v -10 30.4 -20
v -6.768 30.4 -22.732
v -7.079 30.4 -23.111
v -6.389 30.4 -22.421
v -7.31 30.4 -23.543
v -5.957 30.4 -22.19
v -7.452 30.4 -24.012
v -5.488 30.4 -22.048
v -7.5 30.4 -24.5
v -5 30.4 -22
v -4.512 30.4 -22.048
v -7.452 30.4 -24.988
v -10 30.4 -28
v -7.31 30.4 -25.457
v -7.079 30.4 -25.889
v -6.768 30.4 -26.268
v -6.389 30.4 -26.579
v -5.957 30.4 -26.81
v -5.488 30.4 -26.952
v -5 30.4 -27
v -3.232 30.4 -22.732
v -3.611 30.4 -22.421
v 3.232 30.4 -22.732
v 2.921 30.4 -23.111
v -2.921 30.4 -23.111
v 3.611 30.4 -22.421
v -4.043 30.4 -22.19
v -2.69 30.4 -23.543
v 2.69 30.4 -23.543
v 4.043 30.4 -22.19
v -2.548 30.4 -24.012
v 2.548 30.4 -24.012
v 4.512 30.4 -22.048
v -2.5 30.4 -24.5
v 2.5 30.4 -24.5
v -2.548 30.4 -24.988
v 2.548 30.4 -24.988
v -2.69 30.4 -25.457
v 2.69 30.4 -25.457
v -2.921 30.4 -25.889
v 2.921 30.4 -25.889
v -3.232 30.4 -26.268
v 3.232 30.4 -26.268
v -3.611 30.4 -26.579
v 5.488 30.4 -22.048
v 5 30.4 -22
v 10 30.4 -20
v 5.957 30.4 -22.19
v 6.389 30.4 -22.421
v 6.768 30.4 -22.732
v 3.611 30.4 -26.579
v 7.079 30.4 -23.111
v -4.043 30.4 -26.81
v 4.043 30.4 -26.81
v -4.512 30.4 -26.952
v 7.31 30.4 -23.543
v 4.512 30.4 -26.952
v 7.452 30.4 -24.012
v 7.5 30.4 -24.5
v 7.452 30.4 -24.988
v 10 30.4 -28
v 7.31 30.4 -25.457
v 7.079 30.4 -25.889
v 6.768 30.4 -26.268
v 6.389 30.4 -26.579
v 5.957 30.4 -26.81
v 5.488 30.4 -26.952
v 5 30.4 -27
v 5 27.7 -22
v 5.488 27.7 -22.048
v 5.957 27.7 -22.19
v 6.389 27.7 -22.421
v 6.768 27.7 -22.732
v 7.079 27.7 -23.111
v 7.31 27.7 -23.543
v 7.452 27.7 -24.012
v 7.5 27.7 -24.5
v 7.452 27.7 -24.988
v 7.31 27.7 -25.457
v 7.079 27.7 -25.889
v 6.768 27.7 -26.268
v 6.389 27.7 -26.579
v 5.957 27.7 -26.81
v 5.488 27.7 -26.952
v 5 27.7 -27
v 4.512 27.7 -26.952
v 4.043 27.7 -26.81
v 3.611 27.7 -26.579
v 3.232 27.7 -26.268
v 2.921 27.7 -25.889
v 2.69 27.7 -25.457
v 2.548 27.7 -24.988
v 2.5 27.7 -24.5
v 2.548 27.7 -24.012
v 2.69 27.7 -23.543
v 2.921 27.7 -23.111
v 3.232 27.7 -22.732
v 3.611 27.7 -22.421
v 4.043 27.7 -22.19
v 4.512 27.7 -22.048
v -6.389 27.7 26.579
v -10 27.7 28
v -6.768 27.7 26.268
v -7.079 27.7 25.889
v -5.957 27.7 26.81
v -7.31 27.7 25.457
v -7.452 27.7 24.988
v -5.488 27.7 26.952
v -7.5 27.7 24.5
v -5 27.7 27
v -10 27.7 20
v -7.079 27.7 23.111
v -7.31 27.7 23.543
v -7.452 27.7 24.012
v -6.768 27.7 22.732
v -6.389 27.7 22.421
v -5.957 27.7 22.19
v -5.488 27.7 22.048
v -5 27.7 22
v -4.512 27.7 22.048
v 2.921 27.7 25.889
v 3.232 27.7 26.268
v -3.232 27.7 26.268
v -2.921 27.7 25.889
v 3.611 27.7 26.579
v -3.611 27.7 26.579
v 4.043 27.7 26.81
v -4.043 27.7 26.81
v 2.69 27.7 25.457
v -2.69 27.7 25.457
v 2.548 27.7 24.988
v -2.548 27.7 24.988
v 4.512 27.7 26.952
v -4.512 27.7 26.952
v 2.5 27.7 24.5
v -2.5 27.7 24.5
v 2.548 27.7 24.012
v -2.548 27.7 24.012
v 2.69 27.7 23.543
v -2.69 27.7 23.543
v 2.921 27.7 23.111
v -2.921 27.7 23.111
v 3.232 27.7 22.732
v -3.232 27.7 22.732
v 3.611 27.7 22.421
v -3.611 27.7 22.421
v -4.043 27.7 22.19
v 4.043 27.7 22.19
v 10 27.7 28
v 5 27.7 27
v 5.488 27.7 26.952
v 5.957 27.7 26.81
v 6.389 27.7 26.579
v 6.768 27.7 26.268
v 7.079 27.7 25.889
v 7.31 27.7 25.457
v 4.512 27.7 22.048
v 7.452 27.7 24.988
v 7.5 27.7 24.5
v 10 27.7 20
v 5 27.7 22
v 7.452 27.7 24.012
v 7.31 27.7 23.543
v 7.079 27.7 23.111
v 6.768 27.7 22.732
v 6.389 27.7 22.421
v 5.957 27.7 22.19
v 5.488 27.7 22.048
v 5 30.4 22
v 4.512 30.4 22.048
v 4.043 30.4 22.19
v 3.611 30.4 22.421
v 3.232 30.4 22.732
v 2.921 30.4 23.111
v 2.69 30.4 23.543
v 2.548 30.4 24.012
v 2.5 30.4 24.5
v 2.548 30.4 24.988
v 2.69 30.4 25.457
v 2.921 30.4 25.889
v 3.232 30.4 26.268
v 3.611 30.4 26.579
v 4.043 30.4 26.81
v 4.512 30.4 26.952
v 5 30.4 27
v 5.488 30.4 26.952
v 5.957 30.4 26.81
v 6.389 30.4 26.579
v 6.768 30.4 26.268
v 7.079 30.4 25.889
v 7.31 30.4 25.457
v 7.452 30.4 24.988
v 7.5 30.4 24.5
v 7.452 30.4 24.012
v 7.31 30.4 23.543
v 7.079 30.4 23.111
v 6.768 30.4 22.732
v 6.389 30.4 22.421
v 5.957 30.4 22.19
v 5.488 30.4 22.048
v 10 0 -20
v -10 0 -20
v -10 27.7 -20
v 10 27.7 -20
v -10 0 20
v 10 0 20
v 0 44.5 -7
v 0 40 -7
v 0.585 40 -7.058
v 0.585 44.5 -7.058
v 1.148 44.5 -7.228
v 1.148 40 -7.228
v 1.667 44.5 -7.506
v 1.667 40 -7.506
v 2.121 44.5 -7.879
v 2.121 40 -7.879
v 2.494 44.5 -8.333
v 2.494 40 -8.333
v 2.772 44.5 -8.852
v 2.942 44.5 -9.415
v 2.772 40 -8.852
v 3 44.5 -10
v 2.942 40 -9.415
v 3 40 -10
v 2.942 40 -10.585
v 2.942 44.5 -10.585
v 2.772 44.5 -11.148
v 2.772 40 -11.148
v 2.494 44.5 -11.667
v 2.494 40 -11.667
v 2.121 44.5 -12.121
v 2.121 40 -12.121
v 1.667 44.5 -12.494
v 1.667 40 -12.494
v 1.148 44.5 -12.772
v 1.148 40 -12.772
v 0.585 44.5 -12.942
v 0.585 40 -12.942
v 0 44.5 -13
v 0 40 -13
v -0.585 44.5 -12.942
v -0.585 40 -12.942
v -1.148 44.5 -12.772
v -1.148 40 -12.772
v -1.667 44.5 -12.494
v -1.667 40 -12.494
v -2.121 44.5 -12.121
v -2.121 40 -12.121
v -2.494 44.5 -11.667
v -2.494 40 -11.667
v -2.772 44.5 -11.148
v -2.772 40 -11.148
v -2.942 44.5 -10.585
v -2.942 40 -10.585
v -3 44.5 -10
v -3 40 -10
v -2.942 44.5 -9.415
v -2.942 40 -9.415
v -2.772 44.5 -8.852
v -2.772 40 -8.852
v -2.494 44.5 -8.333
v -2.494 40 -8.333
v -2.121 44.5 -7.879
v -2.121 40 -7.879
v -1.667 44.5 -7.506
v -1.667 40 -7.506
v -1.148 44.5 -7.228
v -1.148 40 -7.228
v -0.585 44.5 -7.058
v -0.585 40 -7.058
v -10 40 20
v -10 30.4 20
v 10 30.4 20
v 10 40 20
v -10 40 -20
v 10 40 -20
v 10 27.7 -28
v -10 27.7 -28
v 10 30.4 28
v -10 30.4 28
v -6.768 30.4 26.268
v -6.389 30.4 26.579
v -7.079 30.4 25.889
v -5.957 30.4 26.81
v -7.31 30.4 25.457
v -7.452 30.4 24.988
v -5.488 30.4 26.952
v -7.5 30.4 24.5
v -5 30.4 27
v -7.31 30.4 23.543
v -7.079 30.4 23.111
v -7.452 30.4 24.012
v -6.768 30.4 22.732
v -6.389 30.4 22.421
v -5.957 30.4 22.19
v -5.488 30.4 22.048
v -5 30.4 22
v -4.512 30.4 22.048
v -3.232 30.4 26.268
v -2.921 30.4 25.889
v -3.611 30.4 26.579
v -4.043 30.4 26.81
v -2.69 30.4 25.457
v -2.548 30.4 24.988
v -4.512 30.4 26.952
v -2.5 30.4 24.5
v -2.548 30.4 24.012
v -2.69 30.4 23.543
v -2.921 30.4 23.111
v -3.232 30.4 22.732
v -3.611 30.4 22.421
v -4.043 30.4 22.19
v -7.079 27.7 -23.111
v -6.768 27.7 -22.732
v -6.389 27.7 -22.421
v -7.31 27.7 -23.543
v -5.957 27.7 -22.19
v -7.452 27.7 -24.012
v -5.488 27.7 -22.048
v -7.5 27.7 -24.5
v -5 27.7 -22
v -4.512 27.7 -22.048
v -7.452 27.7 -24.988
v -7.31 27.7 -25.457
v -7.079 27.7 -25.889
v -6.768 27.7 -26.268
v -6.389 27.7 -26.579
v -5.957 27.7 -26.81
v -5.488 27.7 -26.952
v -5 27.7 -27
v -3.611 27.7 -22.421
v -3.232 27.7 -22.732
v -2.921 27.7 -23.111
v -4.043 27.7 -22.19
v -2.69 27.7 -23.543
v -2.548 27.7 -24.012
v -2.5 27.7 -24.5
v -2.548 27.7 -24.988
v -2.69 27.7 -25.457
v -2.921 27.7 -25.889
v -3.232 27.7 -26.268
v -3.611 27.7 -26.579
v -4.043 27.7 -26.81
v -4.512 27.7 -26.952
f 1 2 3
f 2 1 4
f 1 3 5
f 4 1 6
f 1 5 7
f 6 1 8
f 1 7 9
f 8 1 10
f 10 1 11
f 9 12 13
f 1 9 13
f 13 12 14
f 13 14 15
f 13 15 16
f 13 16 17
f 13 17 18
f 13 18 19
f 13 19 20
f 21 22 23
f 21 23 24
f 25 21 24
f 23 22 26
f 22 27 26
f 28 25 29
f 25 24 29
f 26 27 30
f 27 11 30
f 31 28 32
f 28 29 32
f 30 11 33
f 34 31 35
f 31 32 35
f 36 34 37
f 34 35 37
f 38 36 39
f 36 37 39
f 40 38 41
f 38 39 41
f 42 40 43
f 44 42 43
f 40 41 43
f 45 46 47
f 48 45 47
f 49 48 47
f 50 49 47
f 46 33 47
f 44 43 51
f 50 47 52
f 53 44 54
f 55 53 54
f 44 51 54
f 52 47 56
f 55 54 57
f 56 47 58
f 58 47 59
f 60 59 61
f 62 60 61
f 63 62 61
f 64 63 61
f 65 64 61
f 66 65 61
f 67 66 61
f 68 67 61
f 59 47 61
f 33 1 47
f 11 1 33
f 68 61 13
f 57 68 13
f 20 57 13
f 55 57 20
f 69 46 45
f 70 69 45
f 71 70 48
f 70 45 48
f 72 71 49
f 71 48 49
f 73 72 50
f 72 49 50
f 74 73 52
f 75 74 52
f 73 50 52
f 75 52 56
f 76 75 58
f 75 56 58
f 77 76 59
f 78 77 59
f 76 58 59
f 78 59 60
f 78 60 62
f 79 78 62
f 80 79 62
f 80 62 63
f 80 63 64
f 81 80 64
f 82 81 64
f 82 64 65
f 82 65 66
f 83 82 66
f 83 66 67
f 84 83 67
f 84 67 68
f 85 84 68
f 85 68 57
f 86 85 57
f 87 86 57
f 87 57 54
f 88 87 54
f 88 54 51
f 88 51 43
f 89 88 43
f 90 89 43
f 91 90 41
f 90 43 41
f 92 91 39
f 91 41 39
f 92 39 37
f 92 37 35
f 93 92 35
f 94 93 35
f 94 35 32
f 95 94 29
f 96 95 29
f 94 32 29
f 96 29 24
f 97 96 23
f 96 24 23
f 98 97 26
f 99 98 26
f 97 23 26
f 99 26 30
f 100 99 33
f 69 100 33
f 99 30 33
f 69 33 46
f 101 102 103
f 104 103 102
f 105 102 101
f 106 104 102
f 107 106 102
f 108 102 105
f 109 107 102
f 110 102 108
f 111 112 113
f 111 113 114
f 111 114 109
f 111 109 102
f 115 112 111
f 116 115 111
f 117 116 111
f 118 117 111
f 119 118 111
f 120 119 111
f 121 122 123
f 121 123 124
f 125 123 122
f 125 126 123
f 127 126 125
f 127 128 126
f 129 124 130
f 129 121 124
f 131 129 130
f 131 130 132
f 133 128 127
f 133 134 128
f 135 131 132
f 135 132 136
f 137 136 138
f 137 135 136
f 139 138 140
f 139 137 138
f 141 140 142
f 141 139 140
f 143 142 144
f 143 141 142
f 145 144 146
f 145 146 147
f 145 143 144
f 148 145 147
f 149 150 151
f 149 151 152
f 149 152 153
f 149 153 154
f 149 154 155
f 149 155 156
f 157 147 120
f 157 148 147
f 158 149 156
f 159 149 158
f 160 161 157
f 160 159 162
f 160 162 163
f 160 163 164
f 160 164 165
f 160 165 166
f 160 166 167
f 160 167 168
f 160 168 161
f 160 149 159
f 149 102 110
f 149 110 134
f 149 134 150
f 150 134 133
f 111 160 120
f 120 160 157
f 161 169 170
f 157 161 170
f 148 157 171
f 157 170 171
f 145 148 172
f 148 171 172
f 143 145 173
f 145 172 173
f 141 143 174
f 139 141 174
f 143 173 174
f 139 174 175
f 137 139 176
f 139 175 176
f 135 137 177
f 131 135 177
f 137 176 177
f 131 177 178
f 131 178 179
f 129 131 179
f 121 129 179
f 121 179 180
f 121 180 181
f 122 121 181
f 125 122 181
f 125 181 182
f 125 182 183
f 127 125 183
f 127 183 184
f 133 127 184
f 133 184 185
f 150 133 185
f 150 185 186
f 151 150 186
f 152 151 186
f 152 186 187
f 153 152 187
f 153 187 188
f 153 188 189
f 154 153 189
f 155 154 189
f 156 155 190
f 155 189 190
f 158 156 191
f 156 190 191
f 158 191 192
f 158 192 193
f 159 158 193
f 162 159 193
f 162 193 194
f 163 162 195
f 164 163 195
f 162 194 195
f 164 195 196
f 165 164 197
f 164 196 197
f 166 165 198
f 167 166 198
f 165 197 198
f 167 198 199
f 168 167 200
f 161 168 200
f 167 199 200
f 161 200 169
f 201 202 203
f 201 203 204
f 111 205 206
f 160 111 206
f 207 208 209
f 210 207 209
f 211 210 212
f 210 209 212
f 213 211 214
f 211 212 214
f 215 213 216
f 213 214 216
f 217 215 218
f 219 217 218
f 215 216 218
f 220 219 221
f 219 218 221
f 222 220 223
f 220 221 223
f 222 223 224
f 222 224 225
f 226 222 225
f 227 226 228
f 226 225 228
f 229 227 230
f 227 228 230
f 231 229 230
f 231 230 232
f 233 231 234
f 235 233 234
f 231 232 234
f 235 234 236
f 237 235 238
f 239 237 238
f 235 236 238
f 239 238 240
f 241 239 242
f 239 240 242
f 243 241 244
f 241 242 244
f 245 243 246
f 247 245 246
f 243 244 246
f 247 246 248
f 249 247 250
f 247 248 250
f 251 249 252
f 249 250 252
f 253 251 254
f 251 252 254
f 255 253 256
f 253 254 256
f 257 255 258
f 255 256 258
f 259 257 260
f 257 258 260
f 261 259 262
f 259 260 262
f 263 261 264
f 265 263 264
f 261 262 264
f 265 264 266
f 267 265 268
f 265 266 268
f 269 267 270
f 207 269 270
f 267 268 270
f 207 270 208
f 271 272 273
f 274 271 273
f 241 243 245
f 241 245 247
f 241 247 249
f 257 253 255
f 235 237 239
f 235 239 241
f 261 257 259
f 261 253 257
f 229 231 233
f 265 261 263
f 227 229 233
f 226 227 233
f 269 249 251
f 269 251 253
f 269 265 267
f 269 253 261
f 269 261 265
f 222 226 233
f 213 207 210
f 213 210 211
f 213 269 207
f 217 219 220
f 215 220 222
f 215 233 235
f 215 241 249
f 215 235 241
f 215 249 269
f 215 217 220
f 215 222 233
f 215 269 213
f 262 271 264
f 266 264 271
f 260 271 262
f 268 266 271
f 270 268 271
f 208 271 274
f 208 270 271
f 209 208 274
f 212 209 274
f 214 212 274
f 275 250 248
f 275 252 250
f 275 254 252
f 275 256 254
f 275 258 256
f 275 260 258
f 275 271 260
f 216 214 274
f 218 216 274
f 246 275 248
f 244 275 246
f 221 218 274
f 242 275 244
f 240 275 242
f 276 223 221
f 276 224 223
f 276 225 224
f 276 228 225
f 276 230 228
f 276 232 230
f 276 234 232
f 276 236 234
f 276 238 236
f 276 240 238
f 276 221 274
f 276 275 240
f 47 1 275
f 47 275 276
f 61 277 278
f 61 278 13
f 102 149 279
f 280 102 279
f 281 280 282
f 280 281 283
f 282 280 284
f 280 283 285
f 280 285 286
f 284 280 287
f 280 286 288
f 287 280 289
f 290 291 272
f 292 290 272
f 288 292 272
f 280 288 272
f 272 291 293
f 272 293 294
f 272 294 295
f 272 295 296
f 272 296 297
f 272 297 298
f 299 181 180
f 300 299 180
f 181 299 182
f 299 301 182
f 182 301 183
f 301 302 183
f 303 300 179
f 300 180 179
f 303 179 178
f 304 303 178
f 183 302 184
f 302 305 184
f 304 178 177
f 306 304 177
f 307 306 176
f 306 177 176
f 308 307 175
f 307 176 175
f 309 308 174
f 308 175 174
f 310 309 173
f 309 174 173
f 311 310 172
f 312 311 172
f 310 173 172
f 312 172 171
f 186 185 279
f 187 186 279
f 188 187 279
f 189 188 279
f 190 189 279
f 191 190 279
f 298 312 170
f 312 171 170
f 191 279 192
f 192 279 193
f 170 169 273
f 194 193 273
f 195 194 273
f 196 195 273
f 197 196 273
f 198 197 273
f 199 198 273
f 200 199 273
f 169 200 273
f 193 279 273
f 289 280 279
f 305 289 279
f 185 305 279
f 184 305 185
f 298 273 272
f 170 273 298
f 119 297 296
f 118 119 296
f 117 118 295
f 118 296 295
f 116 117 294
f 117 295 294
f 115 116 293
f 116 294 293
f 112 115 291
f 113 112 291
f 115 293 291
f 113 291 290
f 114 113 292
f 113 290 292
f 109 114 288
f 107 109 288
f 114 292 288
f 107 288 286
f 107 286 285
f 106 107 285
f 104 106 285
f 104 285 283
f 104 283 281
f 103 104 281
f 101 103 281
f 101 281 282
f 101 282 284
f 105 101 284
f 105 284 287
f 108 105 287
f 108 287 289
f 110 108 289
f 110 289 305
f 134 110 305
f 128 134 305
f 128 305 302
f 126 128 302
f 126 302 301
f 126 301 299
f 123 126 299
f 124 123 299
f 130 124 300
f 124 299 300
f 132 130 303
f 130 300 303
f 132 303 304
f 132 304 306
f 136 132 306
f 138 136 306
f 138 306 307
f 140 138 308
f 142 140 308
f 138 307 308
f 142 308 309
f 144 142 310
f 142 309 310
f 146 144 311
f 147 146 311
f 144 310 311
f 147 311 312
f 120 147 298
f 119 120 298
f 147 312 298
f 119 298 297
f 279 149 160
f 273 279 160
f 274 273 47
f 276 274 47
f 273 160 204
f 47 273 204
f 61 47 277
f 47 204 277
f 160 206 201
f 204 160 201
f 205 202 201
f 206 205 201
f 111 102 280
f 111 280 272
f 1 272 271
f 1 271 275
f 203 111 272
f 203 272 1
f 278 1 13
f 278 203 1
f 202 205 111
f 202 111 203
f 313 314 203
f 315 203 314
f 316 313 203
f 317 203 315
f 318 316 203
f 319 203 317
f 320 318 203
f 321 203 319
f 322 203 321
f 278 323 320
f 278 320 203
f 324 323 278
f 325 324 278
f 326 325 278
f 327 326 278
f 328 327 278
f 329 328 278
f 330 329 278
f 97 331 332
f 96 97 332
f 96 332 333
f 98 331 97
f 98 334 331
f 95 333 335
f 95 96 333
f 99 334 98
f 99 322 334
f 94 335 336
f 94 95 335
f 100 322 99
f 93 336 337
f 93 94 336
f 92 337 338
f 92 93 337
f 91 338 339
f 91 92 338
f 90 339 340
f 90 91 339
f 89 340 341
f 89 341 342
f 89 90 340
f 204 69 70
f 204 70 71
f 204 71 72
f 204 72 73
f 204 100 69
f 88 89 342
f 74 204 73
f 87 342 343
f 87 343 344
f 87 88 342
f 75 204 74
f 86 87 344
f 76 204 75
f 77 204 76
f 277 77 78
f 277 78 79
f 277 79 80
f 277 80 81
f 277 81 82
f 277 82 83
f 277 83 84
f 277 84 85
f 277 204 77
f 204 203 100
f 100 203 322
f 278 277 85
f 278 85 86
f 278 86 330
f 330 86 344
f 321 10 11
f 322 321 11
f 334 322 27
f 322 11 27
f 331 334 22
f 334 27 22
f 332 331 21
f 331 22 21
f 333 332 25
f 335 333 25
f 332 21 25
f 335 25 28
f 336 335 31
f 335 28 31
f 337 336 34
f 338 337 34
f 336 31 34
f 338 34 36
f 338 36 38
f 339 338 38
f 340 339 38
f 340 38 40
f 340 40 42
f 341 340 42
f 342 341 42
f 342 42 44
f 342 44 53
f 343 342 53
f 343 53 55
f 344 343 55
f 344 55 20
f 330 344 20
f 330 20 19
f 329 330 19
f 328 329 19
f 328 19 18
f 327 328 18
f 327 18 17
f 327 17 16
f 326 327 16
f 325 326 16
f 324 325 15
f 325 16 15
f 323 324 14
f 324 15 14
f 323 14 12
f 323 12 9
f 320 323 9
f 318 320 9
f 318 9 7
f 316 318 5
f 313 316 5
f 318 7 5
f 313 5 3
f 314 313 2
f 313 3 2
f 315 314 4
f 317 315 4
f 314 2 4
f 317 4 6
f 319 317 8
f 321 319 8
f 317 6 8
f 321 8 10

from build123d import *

# Parameters (mm, degrees)
SKETCH_1_W          = 20
SKETCH_1_H          = 40
EXTRUDE_1_DEPTH     = 40
SKETCH_3_W          = 8
SKETCH_3_H          = 2.7
EXTRUDE_2_DEPTH     = 20
SKETCH_4_R          = 2.5
CUT_EXTRUDE_1_DEPTH = 40
SKETCH_5_R          = 3
EXTRUDE_3_DEPTH     = 4.5


with BuildPart() as part:
    # 草圖1 → 填料-伸長1 (new body)
    with BuildSketch(Plane(origin=(0, 0, 0), x_dir=(1, 0, 0), z_dir=(0, 1, 0))):
        Rectangle(SKETCH_1_W, SKETCH_1_H)
    extrude(amount=EXTRUDE_1_DEPTH)

    # 草圖3 → 填料-伸長2 (add)
    with BuildSketch(Plane(origin=(10, 0, 0), x_dir=(0, 0, -1), z_dir=(1, 0, 0))):
        with Locations((24, 29.05)):
            Rectangle(SKETCH_3_W, SKETCH_3_H)
        with Locations((-24, 29.05)):
            Rectangle(SKETCH_3_W, SKETCH_3_H)
    extrude(amount=-EXTRUDE_2_DEPTH)

    # 草圖4 → 除料-伸長1 (cut)
    with BuildSketch(Plane(origin=(0, 30.4, 0), x_dir=(1, 0, 0), z_dir=(0, 1, 0))):
        with Locations(Location((5, 24.5, 0), (0, 0, 270))):
            Circle(SKETCH_4_R)
        with Locations(Location((-5, 24.5, 0), (0, 0, 270))):
            Circle(SKETCH_4_R)
        with Locations(Location((-5, -24.5, 0), (0, 0, 90))):
            Circle(SKETCH_4_R)
        with Locations(Location((5, -24.5, 0), (0, 0, 90))):
            Circle(SKETCH_4_R)
    extrude(amount=-CUT_EXTRUDE_1_DEPTH, mode=Mode.SUBTRACT)

    # 草圖5 → 填料-伸長3 (add)
    with BuildSketch(Plane(origin=(0, 40, 0), x_dir=(1, 0, 0), z_dir=(0, 1, 0))):
        with Locations(Location((0, 10, 0), (0, 0, 270))):
            Circle(SKETCH_5_R)
    extrude(amount=EXTRUDE_3_DEPTH)


solid = part.part
